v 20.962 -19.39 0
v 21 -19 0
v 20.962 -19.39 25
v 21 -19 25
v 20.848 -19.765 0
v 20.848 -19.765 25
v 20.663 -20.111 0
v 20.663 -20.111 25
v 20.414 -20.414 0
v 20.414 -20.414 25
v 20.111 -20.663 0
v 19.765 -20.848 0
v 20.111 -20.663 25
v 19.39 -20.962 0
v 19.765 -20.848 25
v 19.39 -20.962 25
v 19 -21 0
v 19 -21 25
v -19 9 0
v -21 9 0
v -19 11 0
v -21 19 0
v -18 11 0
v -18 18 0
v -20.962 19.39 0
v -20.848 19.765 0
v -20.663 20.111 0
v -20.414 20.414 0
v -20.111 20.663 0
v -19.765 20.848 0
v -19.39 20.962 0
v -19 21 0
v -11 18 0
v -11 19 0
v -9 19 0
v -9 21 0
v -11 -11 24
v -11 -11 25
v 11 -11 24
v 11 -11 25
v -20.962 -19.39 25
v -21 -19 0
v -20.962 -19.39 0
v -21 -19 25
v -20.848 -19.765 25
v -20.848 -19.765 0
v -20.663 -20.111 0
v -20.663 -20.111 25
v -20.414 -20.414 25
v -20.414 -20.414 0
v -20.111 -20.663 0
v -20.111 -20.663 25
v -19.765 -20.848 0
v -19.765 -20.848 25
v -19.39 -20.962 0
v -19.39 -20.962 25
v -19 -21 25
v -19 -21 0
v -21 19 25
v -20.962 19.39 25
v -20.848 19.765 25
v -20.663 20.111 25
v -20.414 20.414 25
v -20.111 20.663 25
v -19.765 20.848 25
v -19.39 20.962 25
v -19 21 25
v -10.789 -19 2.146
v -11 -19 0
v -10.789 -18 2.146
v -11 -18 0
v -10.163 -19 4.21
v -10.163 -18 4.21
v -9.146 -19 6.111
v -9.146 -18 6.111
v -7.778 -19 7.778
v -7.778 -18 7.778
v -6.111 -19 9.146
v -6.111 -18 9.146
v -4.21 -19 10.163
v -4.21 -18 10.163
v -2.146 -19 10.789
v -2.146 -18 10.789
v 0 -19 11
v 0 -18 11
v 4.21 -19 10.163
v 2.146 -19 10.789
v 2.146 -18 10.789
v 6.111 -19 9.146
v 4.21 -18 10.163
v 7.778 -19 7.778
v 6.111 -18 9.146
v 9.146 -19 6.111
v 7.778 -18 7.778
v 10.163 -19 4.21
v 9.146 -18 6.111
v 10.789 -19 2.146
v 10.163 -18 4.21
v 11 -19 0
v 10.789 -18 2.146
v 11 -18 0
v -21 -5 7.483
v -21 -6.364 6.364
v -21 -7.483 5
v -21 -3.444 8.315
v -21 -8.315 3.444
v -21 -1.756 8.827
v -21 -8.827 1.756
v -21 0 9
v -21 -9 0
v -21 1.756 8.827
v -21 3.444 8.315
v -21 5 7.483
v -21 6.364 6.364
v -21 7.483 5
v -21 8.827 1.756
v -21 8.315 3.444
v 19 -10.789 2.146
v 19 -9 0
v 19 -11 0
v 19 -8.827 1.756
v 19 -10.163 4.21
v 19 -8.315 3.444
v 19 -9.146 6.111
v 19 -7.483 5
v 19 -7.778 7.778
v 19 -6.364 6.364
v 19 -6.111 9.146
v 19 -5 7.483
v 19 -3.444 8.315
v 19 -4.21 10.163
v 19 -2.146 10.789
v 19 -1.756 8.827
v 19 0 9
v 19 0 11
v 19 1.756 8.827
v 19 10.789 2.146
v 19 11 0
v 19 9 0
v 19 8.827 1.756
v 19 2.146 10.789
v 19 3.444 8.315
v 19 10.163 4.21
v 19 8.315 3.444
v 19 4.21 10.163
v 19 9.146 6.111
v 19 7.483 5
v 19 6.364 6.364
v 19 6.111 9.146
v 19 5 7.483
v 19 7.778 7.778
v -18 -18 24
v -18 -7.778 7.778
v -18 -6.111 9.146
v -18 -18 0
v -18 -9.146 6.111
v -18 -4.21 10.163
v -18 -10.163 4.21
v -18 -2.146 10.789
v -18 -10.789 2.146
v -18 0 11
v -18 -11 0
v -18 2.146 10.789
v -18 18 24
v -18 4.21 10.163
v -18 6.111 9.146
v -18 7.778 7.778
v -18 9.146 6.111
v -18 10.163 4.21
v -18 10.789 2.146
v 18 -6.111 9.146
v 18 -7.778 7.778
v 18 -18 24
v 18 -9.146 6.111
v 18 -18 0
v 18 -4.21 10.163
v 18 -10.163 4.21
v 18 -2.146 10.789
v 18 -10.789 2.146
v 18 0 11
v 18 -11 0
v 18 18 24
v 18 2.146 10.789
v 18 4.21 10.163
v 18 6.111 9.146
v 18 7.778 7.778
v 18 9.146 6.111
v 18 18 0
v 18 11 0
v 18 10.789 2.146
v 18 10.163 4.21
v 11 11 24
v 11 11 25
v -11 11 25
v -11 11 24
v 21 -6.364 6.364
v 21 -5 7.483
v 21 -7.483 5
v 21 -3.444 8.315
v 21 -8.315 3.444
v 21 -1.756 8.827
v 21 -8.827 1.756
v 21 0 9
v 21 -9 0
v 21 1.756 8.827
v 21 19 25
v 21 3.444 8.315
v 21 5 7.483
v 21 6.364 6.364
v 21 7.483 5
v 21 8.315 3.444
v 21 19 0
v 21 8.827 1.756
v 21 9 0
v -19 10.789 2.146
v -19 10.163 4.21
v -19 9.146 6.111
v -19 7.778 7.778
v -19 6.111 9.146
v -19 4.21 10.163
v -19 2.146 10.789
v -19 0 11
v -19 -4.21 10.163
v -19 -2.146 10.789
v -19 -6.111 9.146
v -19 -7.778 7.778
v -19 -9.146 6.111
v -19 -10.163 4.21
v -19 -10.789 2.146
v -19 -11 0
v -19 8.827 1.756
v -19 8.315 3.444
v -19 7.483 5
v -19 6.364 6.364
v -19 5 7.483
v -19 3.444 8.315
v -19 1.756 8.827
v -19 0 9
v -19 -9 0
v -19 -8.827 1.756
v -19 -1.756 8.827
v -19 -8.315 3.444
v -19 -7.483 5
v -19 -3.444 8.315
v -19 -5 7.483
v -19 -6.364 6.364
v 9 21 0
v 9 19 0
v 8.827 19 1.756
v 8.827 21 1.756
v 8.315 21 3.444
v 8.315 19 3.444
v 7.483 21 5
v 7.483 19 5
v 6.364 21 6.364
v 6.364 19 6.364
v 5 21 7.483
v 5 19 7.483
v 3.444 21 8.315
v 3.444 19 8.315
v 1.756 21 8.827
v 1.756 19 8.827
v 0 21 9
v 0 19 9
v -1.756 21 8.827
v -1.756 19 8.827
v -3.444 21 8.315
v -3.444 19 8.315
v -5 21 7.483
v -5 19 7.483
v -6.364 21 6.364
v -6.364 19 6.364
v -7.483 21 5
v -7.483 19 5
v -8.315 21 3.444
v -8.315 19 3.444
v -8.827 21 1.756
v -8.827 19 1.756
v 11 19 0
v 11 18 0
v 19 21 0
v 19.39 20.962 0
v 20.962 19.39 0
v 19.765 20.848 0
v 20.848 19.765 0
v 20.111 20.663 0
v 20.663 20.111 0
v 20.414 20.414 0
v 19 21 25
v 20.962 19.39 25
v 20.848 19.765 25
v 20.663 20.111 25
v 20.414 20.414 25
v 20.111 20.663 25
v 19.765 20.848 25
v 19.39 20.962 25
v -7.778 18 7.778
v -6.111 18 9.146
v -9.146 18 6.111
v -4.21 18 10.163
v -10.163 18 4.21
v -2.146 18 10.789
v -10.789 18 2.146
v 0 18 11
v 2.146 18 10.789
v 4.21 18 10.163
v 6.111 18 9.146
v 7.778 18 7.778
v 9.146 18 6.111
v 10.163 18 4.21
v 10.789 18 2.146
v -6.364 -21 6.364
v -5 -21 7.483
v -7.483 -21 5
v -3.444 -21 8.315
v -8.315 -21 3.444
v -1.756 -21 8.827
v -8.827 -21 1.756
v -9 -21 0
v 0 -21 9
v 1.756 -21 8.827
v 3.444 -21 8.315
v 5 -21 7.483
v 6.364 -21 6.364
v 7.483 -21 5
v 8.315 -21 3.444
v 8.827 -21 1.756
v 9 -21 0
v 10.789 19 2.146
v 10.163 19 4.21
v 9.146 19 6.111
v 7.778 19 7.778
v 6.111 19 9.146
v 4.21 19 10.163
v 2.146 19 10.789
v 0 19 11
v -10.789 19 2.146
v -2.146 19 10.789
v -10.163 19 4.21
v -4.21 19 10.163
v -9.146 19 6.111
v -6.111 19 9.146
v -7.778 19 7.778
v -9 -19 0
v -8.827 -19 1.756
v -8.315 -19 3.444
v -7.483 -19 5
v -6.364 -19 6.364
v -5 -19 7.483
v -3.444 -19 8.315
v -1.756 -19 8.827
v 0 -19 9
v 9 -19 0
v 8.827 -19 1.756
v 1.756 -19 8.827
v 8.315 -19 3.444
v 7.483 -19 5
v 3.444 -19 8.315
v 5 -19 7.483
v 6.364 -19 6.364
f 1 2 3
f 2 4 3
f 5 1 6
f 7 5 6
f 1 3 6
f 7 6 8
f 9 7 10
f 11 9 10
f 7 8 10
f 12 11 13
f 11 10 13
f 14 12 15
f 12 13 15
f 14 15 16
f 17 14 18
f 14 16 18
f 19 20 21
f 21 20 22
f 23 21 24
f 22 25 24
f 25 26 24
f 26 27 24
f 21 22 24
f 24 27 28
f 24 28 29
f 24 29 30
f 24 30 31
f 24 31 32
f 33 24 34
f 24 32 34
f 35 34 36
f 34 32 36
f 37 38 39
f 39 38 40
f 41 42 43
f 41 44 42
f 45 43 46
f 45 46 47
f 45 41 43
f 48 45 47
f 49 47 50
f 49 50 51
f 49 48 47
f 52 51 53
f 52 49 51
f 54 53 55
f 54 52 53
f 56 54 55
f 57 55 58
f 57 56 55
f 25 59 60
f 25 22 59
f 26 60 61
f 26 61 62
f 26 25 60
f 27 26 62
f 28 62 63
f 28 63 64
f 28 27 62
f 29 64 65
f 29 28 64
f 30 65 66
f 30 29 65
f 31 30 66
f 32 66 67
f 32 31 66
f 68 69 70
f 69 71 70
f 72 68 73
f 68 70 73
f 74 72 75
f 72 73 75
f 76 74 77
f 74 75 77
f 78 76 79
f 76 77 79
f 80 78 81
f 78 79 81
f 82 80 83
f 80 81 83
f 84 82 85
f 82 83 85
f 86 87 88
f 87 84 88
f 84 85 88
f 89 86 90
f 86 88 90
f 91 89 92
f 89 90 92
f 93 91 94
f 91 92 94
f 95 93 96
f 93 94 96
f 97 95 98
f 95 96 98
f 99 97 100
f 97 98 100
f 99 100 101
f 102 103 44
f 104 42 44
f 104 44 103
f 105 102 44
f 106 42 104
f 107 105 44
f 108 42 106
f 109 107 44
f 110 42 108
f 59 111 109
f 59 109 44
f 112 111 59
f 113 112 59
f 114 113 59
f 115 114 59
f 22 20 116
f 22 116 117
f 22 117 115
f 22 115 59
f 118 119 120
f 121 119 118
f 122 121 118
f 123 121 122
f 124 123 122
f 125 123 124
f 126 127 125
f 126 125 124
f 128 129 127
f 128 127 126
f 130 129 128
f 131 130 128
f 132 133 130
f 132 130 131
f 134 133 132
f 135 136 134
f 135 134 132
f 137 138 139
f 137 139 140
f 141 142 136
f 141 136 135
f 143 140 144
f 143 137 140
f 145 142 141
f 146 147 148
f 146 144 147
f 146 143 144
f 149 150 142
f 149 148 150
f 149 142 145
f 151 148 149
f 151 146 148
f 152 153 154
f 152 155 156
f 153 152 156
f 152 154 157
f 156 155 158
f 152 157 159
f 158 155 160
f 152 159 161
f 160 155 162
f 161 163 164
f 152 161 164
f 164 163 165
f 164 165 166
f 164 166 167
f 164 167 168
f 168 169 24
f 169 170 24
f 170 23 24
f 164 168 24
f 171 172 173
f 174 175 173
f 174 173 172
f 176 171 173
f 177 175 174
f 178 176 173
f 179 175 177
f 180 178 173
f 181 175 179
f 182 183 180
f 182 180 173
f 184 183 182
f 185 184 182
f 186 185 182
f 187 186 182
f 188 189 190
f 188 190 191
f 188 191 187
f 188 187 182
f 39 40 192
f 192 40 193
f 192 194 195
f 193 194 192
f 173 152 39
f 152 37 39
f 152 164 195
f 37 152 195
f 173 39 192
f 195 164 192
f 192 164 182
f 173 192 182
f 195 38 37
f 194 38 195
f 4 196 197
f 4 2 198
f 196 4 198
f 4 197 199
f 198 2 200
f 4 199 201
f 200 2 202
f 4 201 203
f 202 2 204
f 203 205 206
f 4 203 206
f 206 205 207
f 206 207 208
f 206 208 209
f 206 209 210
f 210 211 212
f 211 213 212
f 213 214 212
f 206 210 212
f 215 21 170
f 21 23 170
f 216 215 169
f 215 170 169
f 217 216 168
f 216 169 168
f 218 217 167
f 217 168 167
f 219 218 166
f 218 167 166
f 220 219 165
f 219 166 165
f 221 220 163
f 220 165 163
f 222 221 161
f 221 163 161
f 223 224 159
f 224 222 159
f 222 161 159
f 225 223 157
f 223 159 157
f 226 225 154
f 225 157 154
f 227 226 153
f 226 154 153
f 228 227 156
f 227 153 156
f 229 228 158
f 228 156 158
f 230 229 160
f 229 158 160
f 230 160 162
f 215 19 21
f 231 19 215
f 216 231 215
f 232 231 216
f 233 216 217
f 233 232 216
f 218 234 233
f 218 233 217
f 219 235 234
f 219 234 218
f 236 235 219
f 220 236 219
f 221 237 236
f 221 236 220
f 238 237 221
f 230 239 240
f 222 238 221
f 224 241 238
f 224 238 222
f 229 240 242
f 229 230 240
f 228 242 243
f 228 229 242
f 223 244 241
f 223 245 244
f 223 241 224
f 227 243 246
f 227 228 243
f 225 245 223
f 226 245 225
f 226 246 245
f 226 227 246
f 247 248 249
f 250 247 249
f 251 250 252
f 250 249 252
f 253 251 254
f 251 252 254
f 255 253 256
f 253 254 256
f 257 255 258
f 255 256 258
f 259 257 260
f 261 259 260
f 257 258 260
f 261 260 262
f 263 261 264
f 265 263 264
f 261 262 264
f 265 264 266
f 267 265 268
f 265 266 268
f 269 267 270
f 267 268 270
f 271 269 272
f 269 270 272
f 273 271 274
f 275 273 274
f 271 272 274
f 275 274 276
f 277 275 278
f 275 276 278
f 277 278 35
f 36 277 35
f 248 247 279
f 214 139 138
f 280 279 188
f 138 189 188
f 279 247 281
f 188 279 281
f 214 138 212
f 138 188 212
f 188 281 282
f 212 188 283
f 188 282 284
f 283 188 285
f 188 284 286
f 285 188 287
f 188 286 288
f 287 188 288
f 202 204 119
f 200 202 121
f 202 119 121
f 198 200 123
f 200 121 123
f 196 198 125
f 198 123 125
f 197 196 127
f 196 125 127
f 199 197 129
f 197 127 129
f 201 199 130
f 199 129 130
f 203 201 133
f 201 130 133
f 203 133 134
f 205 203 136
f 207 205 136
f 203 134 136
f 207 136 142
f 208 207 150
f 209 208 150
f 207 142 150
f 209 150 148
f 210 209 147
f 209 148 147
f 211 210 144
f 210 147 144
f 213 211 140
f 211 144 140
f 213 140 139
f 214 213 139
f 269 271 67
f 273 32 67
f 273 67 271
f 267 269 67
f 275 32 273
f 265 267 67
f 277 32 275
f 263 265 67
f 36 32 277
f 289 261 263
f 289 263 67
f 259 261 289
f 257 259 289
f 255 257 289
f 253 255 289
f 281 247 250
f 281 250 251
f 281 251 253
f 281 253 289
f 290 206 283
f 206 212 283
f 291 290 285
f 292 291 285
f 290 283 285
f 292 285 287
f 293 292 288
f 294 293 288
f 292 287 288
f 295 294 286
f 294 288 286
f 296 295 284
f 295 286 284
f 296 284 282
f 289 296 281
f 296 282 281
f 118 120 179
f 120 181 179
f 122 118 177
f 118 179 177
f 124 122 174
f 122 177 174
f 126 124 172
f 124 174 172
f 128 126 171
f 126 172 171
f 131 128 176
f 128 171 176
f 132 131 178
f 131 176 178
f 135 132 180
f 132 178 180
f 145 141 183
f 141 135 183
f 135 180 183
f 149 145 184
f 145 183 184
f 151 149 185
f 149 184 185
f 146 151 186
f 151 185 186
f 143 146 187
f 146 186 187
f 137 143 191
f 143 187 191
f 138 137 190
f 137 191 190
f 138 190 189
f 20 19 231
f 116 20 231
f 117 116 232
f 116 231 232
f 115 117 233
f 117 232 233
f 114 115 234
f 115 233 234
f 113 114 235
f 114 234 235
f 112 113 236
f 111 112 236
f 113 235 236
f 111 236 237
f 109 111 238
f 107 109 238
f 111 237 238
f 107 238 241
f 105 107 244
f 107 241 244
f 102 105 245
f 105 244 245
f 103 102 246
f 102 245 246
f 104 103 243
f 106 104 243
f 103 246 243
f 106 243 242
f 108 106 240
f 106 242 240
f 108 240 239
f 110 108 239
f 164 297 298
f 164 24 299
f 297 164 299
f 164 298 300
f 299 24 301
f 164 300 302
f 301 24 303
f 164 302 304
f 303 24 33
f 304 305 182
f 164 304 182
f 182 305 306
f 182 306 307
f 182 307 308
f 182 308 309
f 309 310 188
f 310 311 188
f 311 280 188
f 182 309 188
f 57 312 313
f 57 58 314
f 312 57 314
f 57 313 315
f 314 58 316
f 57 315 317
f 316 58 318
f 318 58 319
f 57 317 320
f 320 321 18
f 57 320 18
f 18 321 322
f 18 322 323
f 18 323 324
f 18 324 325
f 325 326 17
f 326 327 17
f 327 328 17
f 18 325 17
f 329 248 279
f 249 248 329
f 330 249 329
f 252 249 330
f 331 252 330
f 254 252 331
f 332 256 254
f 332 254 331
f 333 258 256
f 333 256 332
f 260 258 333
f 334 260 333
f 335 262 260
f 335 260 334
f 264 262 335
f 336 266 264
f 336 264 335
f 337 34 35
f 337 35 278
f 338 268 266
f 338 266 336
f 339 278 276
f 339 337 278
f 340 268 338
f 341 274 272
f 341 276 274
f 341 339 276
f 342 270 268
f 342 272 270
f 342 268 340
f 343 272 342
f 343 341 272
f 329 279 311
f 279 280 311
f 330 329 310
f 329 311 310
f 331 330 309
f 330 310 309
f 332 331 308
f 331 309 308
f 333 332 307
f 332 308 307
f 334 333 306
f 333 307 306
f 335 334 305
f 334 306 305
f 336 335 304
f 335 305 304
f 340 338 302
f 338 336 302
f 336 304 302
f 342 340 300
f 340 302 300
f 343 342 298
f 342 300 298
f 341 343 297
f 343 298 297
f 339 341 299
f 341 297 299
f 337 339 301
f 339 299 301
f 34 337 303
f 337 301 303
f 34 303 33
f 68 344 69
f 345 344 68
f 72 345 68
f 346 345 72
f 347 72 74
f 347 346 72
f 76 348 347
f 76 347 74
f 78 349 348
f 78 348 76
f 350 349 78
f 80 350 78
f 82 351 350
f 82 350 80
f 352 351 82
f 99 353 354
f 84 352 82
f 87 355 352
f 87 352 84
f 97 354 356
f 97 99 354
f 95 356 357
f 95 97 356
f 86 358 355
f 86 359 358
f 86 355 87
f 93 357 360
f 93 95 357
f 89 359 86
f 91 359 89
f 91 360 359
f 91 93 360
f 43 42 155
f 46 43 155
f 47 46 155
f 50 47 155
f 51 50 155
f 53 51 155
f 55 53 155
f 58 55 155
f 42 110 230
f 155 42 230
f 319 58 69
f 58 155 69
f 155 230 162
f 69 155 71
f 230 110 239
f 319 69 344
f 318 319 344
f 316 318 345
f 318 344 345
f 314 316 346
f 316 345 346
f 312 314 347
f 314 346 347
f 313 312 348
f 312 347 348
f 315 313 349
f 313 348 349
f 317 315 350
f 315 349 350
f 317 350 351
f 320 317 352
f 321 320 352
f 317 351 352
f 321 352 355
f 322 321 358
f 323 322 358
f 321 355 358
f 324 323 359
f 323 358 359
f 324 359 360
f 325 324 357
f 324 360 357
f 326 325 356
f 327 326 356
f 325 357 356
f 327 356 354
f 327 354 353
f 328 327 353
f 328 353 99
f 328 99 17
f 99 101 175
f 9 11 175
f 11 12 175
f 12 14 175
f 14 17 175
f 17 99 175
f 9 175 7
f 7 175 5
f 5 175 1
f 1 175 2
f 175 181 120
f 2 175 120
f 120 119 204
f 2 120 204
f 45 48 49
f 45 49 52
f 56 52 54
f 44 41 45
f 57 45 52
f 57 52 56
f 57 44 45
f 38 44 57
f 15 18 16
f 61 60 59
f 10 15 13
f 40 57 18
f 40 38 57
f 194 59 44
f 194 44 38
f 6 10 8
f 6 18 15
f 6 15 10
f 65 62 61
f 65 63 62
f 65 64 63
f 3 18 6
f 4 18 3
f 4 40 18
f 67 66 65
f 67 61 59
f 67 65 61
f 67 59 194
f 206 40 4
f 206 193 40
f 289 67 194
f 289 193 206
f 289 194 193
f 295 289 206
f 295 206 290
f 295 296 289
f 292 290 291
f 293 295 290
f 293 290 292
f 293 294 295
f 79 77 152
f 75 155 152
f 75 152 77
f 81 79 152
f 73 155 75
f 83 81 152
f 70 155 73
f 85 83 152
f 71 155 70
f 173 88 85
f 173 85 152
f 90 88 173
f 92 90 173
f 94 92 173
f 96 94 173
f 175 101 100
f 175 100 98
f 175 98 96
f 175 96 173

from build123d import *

# Parameters (mm, degrees)
SKETCH1_W           = 42
SKETCH1_H           = 42
SKETCH1_W_2         = 36
SKETCH1_H_2         = 36
BOSS_EXTRUDE1_DEPTH = 24
SKETCH3_R           = 11
CUT_EXTRUDE1_DEPTH  = 1
SKETCH5_R           = 9
CUT_EXTRUDE2_DEPTH  = 4
SKETCH14_W          = 42
SKETCH14_H          = 42
BOSS_EXTRUDE3_DEPTH = 1
CIRPATTERN1_COUNT   = 4
FILLET1_R           = 2
SKETCH15_W          = 22
SKETCH15_H          = 22
CUT_EXTRUDE3_DEPTH  = 26


with BuildPart() as part:
    # Sketch1 → Boss-Extrude1 (new body)
    with BuildSketch(Plane.XY):
        Rectangle(SKETCH1_W, SKETCH1_H)
        Rectangle(SKETCH1_W_2, SKETCH1_H_2, mode=Mode.SUBTRACT)
    extrude(amount=BOSS_EXTRUDE1_DEPTH)

    # Sketch3 → Cut-Extrude1 (cut)
    with BuildSketch(Plane.ZY.offset(-18)):
        Circle(SKETCH3_R)
    cut_extrude1 = extrude(amount=-CUT_EXTRUDE1_DEPTH, mode=Mode.SUBTRACT)

    # Sketch5 → Cut-Extrude2 (cut, through all)
    with BuildSketch(Plane.ZY.offset(-18)):
        Circle(SKETCH5_R)
    cut_extrude2 = extrude(amount=-CUT_EXTRUDE2_DEPTH, mode=Mode.SUBTRACT)

    # Sketch14 → Boss-Extrude3 (add)
    with BuildSketch(Plane.XY.offset(24)):
        Rectangle(SKETCH14_W, SKETCH14_H)
    extrude(amount=BOSS_EXTRUDE3_DEPTH)

    # CirPattern1: Cut-Extrude1, Cut-Extrude2 ×4 about axis
    cirpattern1_axis = Axis((0, 0, 0), (0, 0, 1))
    for i in range(1, CIRPATTERN1_COUNT):
        add(cut_extrude1.rotate(cirpattern1_axis, i * 360 / CIRPATTERN1_COUNT), mode=Mode.SUBTRACT)
        add(cut_extrude2.rotate(cirpattern1_axis, i * 360 / CIRPATTERN1_COUNT), mode=Mode.SUBTRACT)

    # Fillet1
    fillet1_edges = [part.edges().sort_by_distance(p)[0] for p in [
        (21, -21, 12.5),
        (-21, -21, 12.5),
        (-21, 21, 12.5),
        (21, 21, 12.5),
    ]]
    fillet(fillet1_edges, radius=FILLET1_R)

    # Sketch15 → Cut-Extrude3 (cut, through all)
    with BuildSketch(Plane.XY.offset(25)):
        Rectangle(SKETCH15_W, SKETCH15_H)
    extrude(amount=-CUT_EXTRUDE3_DEPTH, mode=Mode.SUBTRACT)


solid = part.part
